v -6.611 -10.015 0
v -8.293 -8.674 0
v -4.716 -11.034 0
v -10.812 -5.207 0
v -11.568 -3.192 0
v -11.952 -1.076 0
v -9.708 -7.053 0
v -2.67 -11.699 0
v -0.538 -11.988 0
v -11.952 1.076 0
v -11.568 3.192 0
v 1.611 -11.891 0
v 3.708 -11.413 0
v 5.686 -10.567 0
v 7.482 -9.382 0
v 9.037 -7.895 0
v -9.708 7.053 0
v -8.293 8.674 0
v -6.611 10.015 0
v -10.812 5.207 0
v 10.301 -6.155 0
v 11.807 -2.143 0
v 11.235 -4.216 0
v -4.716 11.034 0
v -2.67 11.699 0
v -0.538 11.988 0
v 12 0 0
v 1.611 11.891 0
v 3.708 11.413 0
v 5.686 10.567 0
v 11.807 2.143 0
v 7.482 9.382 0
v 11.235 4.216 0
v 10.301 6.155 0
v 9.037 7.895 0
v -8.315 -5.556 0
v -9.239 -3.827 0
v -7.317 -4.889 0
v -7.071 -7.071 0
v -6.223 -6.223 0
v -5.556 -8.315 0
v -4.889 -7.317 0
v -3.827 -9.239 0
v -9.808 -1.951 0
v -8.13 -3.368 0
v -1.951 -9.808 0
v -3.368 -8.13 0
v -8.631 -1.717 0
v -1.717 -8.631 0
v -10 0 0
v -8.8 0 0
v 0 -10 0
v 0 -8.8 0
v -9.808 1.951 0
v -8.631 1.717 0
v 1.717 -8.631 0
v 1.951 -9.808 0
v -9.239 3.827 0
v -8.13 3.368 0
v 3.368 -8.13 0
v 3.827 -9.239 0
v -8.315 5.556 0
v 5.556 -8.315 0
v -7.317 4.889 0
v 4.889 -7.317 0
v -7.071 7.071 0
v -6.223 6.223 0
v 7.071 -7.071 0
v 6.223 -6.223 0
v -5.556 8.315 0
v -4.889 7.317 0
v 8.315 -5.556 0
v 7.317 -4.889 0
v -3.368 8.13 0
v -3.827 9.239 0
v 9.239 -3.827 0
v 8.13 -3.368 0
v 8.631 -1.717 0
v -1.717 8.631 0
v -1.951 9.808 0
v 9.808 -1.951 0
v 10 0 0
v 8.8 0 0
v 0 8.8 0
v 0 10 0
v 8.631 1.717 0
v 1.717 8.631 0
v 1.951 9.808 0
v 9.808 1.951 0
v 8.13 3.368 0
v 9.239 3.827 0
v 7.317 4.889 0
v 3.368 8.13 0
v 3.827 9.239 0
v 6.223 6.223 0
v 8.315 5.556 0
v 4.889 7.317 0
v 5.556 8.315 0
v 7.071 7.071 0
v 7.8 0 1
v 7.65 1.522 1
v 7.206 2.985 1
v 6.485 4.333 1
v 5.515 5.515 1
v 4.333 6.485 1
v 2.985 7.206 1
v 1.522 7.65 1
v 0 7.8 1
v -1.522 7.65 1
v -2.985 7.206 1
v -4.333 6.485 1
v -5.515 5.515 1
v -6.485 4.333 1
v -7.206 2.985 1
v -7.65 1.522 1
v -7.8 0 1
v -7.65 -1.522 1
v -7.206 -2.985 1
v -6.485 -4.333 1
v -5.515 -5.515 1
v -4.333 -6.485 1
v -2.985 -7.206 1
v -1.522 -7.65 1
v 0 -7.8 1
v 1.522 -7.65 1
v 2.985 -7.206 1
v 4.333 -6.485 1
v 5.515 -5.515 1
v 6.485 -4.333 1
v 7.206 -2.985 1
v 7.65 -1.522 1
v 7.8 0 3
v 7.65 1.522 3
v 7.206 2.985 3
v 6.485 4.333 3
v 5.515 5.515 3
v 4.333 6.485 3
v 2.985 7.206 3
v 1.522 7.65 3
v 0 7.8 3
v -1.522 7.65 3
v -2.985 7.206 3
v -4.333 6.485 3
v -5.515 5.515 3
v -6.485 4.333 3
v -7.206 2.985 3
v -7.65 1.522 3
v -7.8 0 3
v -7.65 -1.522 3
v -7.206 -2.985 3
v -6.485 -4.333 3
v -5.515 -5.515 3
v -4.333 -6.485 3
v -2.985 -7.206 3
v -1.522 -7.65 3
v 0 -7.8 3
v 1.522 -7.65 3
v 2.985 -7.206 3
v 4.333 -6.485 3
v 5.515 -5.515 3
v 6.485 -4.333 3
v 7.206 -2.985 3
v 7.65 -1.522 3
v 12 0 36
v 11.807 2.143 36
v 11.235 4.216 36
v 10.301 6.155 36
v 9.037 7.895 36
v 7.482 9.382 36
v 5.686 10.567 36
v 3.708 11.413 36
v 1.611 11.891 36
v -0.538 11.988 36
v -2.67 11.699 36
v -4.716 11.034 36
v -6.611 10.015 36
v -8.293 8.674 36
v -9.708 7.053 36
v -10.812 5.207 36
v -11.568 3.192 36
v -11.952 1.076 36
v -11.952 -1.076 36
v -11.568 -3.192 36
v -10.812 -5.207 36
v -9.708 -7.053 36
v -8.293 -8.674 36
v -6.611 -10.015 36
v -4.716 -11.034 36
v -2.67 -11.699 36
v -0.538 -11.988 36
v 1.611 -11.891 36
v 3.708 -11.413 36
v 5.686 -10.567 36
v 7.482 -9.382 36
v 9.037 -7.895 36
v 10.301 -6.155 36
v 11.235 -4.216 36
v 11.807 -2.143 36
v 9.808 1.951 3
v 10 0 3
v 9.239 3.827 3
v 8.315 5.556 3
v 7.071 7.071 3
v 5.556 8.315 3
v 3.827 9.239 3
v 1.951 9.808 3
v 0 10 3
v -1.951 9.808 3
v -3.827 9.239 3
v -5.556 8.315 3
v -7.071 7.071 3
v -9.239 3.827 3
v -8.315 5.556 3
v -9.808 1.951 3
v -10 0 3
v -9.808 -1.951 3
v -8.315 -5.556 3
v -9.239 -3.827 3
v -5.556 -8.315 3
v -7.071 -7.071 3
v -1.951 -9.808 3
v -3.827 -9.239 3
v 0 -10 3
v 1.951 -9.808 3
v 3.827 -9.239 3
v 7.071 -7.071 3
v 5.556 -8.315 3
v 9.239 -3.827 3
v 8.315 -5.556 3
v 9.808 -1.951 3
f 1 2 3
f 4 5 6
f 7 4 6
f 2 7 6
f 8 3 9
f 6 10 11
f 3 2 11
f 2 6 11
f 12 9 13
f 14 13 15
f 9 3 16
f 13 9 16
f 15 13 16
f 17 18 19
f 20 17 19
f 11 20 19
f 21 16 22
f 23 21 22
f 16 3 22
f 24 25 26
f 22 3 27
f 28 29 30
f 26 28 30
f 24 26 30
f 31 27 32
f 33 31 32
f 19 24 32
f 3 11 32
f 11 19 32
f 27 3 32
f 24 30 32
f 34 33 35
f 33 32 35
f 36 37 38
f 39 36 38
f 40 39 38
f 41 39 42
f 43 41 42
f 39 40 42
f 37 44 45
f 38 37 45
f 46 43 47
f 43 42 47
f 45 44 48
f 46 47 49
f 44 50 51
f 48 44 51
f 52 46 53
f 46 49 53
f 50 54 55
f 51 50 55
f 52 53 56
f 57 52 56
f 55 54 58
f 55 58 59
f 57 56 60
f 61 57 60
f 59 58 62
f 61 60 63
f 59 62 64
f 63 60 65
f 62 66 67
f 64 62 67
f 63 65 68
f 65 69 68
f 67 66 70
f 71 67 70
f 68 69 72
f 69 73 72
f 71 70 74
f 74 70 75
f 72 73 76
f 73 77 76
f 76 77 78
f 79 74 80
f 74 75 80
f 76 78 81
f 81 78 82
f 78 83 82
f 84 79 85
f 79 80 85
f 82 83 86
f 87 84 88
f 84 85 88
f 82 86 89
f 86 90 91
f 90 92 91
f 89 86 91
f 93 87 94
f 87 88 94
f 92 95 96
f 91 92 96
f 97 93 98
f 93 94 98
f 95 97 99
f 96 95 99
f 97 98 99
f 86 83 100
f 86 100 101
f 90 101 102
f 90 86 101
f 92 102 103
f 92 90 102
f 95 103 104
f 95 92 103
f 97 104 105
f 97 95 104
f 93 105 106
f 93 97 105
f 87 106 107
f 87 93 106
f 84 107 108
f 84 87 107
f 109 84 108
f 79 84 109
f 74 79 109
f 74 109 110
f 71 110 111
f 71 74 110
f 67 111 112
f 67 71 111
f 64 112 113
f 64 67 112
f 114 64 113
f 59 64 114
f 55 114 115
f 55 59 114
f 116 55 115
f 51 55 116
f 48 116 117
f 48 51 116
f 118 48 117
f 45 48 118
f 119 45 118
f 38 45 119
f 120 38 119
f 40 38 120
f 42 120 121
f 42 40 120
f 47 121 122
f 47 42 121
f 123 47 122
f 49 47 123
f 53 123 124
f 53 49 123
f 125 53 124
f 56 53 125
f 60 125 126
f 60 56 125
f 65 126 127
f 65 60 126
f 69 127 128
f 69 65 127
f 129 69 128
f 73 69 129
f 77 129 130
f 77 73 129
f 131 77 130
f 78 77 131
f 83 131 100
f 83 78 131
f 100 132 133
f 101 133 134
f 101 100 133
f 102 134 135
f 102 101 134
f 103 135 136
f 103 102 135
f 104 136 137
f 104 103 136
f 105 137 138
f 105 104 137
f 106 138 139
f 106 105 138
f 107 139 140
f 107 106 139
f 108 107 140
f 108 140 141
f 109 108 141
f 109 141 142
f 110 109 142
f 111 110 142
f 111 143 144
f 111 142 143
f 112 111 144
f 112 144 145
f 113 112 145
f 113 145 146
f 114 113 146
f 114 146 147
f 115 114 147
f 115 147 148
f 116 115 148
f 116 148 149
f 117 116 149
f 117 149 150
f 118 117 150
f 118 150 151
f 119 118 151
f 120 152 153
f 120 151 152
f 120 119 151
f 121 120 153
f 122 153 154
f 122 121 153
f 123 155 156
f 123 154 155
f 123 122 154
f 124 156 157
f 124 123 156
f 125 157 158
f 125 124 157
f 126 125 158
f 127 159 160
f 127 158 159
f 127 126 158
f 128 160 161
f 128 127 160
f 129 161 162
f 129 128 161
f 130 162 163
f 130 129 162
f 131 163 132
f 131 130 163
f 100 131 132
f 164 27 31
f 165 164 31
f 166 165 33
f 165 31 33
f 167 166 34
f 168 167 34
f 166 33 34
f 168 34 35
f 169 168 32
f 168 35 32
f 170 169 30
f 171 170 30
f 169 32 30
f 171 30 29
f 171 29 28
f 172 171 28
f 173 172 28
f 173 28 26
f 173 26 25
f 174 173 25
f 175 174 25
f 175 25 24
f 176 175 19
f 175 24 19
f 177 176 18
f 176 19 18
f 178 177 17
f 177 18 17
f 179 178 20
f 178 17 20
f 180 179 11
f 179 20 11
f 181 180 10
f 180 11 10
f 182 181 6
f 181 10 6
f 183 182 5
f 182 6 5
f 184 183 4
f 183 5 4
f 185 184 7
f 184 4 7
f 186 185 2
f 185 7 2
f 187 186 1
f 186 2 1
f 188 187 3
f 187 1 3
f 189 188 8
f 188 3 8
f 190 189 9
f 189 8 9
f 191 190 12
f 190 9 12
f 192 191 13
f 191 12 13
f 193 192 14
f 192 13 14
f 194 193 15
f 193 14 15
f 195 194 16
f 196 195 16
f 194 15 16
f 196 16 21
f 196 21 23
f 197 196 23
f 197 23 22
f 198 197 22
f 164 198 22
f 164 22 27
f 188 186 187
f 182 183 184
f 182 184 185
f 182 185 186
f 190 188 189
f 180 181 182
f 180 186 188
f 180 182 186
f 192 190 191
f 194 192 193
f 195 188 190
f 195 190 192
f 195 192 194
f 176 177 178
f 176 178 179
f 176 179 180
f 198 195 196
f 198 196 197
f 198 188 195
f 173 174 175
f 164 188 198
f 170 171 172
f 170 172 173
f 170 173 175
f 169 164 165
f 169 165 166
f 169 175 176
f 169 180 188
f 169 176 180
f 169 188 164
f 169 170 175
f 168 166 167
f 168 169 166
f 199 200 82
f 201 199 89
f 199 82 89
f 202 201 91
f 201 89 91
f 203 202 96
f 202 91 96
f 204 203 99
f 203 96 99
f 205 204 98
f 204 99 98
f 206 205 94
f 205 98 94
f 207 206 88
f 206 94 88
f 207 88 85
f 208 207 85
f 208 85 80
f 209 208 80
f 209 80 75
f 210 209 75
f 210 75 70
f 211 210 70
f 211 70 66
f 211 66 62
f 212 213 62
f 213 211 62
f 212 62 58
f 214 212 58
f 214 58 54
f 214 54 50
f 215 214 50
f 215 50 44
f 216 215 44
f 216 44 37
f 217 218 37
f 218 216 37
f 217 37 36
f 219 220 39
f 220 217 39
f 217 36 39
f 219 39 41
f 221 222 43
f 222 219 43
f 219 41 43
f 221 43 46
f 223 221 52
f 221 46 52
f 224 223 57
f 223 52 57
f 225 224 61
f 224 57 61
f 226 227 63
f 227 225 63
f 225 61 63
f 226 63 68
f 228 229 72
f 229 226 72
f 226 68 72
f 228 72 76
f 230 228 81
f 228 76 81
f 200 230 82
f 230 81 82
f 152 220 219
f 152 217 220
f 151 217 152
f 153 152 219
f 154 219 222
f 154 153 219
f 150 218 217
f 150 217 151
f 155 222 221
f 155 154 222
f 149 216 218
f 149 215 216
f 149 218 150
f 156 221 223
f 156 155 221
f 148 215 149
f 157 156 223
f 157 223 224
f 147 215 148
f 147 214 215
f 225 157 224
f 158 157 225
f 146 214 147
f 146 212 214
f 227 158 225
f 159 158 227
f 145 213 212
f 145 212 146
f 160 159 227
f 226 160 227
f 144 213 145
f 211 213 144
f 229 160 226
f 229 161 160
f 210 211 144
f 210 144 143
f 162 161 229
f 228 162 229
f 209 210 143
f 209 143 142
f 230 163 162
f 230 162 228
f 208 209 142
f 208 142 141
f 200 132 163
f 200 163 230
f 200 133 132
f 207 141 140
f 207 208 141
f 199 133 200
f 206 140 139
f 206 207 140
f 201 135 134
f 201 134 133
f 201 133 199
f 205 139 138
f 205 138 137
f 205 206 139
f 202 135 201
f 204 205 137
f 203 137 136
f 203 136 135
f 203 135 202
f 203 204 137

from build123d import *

# Parameters (mm, degrees)
CYLINDER003_R     = 12
CYLINDER003_DEPTH = 36
BOX_W             = 25
BOX_H             = 25
BOX_DEPTH         = 36
CYLINDER002_R     = 5
CYLINDER002_DEPTH = 12
CYLINDER001_R     = 7.8
CYLINDER001_DEPTH = 12
CYLINDER_R        = 10
CYLINDER_DEPTH    = 28
CHAMFER_SIZE      = 2.7
CHAMFER001_SIZE   = 1


with BuildPart() as cylinder003:
    # Cylinder003 → Cylinder003 (new body)
    with BuildSketch(Plane.XY):
        Circle(CYLINDER003_R)
    extrude(amount=CYLINDER003_DEPTH)


with BuildPart() as cube:
    # Box → Box (new body)
    with BuildSketch(Plane(origin=(-11, -13, 3), x_dir=(1, 0, 0), z_dir=(0, 0, 1))):
        with Locations((12.5, 12.5)):
            Rectangle(BOX_W, BOX_H)
    extrude(amount=BOX_DEPTH)


with BuildPart() as cylinder002:
    # Cylinder002 → Cylinder002 (new body)
    with BuildSketch(Plane.XY.offset(12)):
        Circle(CYLINDER002_R)
    extrude(amount=CYLINDER002_DEPTH)


with BuildPart() as fusion:
    # Cylinder001 → Cylinder001 (new body)
    with BuildSketch(Plane.XY):
        Circle(CYLINDER001_R)
    extrude(amount=CYLINDER001_DEPTH)

    # Fusion: union Cylinder002
    add(cylinder002.part)


with BuildPart() as cut001:
    # Cylinder → Cylinder (new body)
    with BuildSketch(Plane.XY):
        Circle(CYLINDER_R)
    extrude(amount=CYLINDER_DEPTH)

    # Cut: cut Fusion
    add(fusion.part, mode=Mode.SUBTRACT)

    # Chamfer
    chamfer_edges = [cut001.edges().sort_by_distance(p)[0] for p in [
        (-5, 0, 12),
    ]]
    chamfer(chamfer_edges, length=CHAMFER_SIZE)

    # Chamfer001
    chamfer001_edges = [cut001.edges().sort_by_distance(p)[0] for p in [
        (-7.8, 0, 0),
    ]]
    chamfer(chamfer001_edges, length=CHAMFER001_SIZE)

    # Cut001: cut Cube
    add(cube.part, mode=Mode.SUBTRACT)


solid = Compound([cylinder003.part, cut001.part])
